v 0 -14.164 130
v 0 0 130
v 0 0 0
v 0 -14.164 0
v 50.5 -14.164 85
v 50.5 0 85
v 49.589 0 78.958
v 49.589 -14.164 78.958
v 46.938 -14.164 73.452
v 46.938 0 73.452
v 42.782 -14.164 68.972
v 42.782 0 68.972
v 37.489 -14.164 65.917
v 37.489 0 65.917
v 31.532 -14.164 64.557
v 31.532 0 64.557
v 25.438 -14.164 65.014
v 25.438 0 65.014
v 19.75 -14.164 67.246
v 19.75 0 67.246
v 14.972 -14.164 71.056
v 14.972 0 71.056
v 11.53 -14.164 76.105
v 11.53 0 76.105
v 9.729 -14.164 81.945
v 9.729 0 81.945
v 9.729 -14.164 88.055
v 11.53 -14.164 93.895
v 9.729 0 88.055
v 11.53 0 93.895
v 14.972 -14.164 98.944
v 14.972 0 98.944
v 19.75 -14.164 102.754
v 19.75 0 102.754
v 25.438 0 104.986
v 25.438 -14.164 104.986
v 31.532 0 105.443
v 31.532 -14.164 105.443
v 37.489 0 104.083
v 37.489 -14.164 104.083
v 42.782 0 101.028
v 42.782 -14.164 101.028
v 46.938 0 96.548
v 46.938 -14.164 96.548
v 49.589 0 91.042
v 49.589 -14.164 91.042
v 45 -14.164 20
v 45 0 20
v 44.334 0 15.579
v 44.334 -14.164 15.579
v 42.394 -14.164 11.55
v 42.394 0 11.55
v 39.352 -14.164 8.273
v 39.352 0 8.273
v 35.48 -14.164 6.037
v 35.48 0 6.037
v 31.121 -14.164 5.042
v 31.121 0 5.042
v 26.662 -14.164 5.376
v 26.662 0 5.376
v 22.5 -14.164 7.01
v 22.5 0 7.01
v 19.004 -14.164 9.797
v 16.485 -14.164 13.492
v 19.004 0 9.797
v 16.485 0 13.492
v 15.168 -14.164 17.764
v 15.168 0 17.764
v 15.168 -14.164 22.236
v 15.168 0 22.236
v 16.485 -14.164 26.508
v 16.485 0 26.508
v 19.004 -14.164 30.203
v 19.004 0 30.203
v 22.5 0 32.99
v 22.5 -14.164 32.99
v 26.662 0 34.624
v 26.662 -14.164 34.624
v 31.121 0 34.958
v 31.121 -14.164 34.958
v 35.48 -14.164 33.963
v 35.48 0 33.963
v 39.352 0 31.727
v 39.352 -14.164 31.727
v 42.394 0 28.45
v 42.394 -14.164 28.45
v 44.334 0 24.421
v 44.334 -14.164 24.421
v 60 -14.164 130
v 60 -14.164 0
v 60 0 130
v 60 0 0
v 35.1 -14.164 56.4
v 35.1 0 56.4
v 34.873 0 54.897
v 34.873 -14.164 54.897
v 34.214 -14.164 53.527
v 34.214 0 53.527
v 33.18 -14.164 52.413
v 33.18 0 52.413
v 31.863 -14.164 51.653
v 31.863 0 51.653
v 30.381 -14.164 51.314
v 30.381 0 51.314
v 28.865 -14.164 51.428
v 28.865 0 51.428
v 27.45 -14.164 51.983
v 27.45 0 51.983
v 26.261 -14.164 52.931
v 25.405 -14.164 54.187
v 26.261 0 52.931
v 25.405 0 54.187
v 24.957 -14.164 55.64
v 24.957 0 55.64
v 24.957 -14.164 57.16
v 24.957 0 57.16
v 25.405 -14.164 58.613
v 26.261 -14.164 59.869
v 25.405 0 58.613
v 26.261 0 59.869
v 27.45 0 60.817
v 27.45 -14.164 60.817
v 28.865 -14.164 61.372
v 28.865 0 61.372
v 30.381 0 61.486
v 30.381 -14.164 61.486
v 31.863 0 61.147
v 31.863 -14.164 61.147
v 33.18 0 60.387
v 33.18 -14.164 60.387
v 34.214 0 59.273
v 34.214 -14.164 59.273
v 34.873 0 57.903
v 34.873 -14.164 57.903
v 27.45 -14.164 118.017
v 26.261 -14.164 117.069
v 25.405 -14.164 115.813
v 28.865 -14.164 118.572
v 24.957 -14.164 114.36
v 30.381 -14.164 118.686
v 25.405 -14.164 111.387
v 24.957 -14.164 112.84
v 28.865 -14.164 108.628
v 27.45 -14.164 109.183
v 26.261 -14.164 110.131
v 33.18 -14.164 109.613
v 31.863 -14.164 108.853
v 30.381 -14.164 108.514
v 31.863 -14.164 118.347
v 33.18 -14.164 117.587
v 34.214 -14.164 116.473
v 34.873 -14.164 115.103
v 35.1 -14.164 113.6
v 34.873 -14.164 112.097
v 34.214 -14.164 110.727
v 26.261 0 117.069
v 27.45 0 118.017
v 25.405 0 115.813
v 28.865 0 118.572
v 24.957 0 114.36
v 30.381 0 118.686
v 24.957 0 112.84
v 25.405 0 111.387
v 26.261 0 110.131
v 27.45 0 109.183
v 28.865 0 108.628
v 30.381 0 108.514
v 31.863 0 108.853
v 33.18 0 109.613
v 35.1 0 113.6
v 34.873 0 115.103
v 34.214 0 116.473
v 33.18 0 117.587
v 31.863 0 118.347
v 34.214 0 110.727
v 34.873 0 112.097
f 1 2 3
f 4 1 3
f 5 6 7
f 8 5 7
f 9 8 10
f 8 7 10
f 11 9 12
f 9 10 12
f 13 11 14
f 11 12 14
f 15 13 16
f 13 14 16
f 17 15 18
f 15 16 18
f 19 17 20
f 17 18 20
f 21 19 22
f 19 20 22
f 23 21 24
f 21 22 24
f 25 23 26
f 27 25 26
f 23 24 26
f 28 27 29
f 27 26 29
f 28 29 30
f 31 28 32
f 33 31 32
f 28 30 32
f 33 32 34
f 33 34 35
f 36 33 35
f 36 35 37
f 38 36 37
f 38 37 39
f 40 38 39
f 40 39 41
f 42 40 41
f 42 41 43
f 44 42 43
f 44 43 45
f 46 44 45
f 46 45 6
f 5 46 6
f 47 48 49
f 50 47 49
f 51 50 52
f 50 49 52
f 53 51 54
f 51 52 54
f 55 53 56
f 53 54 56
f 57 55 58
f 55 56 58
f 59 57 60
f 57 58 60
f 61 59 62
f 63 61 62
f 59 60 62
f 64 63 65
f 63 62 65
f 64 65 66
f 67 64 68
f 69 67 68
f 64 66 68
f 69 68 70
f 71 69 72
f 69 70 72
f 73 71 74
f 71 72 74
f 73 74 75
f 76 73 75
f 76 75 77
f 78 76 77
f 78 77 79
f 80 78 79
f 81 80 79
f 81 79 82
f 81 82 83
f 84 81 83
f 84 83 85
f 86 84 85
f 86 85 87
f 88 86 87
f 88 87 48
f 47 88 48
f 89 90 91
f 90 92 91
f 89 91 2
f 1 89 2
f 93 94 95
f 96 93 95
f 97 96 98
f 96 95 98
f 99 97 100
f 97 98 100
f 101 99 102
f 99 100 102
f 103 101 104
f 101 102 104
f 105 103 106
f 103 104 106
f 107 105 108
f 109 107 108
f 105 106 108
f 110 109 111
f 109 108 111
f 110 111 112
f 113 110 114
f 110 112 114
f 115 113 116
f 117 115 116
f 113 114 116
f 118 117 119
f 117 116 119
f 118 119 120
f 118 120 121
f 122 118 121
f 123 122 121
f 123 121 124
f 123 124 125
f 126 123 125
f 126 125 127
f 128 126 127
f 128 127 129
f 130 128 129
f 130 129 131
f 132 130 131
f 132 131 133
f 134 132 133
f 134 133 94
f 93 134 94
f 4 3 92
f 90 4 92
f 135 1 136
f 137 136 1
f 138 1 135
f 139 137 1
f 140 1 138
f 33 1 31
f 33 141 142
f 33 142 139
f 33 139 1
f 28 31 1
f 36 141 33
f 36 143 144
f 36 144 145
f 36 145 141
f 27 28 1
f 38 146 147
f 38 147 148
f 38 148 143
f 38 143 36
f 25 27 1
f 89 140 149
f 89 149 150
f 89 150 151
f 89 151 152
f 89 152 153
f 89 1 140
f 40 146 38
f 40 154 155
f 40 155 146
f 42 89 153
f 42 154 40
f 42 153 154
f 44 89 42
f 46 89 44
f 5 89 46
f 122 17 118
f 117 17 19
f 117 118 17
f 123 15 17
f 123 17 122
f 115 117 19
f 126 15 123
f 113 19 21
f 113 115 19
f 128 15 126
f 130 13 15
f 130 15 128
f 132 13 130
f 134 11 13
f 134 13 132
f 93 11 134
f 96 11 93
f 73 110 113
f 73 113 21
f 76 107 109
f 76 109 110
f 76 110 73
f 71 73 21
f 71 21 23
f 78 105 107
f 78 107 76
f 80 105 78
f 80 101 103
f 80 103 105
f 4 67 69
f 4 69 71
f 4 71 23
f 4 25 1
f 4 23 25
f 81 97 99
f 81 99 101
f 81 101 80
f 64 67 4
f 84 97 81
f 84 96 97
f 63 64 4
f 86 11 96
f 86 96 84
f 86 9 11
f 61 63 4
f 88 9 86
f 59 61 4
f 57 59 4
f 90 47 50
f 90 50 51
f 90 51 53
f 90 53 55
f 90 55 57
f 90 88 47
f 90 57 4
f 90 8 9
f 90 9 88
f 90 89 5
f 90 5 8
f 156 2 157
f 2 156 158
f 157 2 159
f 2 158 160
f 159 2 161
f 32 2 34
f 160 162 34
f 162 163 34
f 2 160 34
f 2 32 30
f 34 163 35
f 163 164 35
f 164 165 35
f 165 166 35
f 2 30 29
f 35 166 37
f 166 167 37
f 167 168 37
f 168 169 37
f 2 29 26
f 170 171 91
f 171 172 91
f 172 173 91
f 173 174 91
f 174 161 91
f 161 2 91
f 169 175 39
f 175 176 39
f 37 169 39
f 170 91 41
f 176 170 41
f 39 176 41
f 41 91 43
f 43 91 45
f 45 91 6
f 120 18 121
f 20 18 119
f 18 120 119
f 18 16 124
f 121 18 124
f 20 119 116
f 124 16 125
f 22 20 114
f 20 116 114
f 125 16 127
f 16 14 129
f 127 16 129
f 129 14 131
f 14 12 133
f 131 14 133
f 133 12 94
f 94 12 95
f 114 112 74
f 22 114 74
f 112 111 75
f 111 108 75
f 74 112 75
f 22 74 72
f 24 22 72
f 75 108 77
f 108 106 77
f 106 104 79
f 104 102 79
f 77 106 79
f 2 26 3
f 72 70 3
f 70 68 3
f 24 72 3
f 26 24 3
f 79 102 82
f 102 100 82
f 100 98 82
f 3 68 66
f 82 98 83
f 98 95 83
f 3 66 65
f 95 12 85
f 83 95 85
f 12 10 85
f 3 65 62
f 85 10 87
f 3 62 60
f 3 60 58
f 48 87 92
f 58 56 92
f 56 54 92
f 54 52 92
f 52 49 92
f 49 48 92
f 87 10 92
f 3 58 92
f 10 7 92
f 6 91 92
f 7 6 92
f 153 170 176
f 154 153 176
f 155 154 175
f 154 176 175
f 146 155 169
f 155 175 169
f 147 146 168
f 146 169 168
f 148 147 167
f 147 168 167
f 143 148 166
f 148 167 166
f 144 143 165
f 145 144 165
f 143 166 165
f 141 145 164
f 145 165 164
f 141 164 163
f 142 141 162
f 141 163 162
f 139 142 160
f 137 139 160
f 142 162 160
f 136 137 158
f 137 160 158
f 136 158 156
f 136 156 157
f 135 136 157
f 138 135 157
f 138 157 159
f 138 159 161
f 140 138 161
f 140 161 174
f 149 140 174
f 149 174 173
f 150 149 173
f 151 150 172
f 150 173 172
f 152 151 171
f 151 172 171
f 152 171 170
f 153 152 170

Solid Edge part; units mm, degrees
sketch "Sketch1" plane through (0, 0, 0) normal (0, -1, 0) x (1, 0, 0)
  line L0 (60, 0) -> (60, 130)
  line L1 (60, 130) -> (0, 130)
  line L2 (0, 130) -> (0, 57.7585)
  line L3 (0, 57.7585) -> (0, 0)
  line L4 (0, 0) -> (60, 0)
extrude "Protrusion1" add sketch "Sketch1" along normal blind 14.1635
sketch "Sketch2" plane through (0, 0, 0) normal (0, -1, 0) x (1, 0, 0)
  circle A0 centre (30, 113.6) radius 5.1
  circle A1 centre (30, 85) radius 20.5
  circle A2 centre (30, 56.4) radius 5.1
  circle A3 centre (30, 20) radius 15
  dimension "D1" = 130
  dimension "D2" = 60
  dimension "D3" = 30
  dimension "D4" = 30
  dimension "D5" = 28.6
  dimension "D6" = 30
  dimension "D7" = 28.6
  dimension "D8" = 45
  dimension "D9" = 30
  dimension "D10" = 20
extrude "ExtrudedCutout_1" cut sketch "Sketch2" along normal blind 65.8643
